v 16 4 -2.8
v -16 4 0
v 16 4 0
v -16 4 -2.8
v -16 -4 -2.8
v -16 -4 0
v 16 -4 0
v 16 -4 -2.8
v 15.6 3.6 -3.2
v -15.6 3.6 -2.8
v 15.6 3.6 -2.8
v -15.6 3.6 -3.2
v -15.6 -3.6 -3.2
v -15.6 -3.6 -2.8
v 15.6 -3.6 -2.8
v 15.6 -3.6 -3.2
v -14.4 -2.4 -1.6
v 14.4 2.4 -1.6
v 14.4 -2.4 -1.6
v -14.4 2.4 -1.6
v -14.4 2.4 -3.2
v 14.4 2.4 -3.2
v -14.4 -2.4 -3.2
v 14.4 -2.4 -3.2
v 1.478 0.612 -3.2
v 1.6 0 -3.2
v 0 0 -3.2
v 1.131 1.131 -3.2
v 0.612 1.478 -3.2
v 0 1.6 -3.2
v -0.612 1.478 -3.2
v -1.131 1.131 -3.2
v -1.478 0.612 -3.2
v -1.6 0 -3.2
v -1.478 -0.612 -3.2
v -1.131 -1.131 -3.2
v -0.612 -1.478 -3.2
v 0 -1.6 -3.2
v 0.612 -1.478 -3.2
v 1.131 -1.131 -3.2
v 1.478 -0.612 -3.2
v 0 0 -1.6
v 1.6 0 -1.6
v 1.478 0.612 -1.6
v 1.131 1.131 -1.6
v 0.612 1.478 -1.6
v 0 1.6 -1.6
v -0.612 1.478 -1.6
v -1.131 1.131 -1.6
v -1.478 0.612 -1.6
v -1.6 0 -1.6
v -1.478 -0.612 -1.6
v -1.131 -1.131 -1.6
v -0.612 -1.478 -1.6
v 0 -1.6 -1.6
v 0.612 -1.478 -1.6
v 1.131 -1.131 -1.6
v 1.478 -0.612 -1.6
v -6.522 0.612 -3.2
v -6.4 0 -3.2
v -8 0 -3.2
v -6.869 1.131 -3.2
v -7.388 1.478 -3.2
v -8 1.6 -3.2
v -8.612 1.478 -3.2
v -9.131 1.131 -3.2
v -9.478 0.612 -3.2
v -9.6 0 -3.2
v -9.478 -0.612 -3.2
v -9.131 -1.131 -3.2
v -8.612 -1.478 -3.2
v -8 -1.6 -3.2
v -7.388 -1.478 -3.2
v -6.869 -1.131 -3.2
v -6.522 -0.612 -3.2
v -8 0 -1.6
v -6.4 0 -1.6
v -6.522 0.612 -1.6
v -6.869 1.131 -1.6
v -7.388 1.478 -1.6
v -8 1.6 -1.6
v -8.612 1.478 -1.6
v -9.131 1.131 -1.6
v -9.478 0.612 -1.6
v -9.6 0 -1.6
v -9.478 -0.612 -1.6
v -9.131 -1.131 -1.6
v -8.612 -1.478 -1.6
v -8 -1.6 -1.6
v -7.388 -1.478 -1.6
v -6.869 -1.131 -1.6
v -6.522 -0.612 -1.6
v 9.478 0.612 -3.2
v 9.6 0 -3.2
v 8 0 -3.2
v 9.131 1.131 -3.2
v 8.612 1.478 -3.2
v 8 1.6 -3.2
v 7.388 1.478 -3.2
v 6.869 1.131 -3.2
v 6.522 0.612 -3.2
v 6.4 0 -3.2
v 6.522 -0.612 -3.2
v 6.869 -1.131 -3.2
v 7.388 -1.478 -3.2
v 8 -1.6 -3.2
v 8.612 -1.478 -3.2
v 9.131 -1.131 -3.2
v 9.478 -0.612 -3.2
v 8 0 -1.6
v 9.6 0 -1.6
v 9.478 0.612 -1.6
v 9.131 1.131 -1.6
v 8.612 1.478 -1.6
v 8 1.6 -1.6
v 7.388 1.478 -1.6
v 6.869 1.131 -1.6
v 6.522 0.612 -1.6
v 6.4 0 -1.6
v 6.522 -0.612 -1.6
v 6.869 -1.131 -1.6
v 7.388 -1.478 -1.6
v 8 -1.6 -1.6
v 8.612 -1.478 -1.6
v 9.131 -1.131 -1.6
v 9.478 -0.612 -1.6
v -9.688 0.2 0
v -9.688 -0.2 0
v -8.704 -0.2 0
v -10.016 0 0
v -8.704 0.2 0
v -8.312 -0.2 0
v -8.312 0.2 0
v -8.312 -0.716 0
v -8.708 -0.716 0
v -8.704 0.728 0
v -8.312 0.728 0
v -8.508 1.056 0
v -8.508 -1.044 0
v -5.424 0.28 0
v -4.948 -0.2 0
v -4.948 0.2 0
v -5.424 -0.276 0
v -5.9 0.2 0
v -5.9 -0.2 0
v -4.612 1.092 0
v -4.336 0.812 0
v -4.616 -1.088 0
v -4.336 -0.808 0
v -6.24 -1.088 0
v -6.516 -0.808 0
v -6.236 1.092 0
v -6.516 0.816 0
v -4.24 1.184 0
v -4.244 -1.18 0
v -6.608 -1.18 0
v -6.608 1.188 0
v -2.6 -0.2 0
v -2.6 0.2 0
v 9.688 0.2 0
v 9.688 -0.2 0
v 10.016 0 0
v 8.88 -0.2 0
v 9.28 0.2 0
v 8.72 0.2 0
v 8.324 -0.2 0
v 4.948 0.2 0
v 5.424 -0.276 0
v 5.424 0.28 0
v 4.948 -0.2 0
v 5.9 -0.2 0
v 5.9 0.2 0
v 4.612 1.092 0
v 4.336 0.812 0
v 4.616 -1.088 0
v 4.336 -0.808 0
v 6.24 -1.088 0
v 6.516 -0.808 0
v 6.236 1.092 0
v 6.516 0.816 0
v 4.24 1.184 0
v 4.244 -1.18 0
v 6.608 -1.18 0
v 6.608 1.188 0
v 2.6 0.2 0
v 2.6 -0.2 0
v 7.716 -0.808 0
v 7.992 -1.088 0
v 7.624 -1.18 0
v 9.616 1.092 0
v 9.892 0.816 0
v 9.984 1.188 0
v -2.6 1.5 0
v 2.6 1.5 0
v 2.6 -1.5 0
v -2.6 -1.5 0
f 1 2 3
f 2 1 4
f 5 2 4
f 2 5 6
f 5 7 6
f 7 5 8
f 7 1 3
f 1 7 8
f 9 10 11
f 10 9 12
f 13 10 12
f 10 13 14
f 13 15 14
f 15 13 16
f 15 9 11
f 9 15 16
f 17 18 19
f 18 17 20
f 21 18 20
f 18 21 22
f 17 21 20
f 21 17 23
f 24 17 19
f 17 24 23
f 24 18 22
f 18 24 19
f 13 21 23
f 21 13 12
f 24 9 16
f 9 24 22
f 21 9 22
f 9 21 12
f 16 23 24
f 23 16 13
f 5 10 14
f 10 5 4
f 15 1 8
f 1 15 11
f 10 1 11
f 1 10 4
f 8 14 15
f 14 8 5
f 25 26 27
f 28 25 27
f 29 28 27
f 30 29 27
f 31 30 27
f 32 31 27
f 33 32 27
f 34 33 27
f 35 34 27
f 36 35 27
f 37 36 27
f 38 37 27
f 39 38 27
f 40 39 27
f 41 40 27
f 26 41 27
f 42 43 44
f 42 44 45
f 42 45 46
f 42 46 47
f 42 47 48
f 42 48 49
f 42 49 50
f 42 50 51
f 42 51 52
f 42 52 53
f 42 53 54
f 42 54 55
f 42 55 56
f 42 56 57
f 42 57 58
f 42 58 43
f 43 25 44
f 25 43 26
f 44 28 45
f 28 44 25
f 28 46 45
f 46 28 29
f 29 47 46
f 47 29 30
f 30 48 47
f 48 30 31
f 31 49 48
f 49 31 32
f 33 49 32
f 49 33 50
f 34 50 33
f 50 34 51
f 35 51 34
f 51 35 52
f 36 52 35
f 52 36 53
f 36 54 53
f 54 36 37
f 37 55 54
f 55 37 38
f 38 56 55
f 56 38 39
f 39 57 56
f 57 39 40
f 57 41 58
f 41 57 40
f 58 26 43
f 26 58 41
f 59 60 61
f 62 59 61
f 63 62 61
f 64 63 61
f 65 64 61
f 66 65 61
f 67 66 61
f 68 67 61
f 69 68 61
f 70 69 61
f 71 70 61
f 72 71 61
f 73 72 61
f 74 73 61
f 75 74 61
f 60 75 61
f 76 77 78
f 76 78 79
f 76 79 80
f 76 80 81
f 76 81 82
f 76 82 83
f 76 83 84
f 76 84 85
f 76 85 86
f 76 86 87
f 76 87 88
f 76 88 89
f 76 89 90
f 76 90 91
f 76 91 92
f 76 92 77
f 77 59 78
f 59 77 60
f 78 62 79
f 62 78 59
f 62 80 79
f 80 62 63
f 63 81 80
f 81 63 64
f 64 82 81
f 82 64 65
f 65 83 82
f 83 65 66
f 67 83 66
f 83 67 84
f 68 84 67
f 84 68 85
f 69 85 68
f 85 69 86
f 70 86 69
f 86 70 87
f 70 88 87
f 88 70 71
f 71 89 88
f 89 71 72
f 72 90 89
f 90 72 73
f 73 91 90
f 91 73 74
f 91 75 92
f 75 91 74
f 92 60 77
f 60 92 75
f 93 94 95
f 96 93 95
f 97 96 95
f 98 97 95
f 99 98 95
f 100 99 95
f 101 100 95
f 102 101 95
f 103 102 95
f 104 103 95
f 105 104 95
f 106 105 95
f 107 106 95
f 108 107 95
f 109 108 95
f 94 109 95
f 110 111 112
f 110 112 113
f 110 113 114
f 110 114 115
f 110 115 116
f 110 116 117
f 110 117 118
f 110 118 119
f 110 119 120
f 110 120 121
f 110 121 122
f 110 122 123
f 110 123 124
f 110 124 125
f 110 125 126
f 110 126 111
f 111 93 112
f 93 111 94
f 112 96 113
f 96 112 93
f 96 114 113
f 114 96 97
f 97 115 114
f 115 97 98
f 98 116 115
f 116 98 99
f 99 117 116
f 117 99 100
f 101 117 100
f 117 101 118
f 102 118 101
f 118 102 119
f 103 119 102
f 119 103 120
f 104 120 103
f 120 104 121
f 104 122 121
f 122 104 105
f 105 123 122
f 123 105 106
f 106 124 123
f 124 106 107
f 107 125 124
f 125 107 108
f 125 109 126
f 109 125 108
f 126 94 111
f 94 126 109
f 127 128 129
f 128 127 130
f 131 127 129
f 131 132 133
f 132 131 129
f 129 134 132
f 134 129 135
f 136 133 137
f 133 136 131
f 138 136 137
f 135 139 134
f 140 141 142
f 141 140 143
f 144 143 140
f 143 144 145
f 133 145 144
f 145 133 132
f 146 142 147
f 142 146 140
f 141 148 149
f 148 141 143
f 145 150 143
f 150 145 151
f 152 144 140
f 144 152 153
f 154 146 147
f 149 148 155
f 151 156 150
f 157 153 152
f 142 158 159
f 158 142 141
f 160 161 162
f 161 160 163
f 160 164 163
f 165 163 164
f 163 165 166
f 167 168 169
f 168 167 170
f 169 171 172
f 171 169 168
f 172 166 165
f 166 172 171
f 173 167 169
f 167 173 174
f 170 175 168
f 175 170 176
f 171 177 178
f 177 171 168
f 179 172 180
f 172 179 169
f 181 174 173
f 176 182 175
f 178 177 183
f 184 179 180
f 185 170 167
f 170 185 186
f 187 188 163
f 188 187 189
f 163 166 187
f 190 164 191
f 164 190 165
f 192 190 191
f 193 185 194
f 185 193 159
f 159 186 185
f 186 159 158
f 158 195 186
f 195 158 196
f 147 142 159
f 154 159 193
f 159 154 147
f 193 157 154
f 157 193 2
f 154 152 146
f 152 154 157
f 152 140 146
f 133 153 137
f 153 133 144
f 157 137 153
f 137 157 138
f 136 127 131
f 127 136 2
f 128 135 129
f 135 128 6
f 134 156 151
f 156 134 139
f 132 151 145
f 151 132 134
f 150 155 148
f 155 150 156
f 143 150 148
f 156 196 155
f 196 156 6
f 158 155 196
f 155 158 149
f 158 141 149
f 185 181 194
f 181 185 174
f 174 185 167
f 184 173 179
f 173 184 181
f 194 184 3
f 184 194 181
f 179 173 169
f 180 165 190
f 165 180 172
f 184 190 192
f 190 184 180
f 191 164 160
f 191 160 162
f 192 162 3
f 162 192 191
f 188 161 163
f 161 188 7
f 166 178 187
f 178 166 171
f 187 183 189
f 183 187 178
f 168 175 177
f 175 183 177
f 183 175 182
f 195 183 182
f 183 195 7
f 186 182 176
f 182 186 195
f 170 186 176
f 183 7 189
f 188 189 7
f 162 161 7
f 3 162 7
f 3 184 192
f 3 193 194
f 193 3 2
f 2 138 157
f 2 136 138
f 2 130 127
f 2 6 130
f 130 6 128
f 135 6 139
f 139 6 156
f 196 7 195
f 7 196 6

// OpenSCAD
// file: ../p/4-4edge.scad
use <../lib.scad>
function ldraw_lib__4_4edge() = [
// 0 Circle 1.0
// 0 Name: 4-4edge.dat
// 0 Author: James Jessiman
// 0 !LDRAW_ORG Primitive UPDATE 2017-01
// 0 !LICENSE Licensed under CC BY 2.0 and CC BY 4.0 : see CAreadme.txt
// 
// 0 BFC CERTIFY CCW
  [0,"BFC","CERTIFY"],
  [0,"BFC","CCW"],
// 
// 0 !HISTORY 1998-12-15 [PTadmin] Official Update 1998-10
// 0 !HISTORY 2005-12-28 [PTadmin] Official Update 2005-01
// 0 !HISTORY 2007-06-24 [PTadmin] Header formatted for Contributor Agreement
// 0 !HISTORY 2008-07-01 [PTadmin] Official Update 2008-01
// 0 !HISTORY 2017-01-15 [Steffen] BFCed
// 0 !HISTORY 2017-12-30 [PTadmin] Official Update 2017-01
// 
// 
// 2 24 1 0 0 0.9239 0 0.3827
  [2,24,1,0,0,0.9239,0,0.3827],
// 2 24 0.9239 0 0.3827 0.7071 0 0.7071
  [2,24,0.9239,0,0.3827,0.7071,0,0.7071],
// 2 24 0.7071 0 0.7071 0.3827 0 0.9239
  [2,24,0.7071,0,0.7071,0.3827,0,0.9239],
// 2 24 0.3827 0 0.9239 0 0 1
  [2,24,0.3827,0,0.9239,0,0,1],
// 2 24 0 0 1 -0.3827 0 0.9239
  [2,24,0,0,1,-0.3827,0,0.9239],
// 2 24 -0.3827 0 0.9239 -0.7071 0 0.7071
  [2,24,-0.3827,0,0.9239,-0.7071,0,0.7071],
// 2 24 -0.7071 0 0.7071 -0.9239 0 0.3827
  [2,24,-0.7071,0,0.7071,-0.9239,0,0.3827],
// 2 24 -0.9239 0 0.3827 -1 0 -0
  [2,24,-0.9239,0,0.3827,-1,0,-0],
// 2 24 -1 0 -0 -0.9239 0 -0.3827
  [2,24,-1,0,-0,-0.9239,0,-0.3827],
// 2 24 -0.9239 0 -0.3827 -0.7071 0 -0.7071
  [2,24,-0.9239,0,-0.3827,-0.7071,0,-0.7071],
// 2 24 -0.7071 0 -0.7071 -0.3827 0 -0.9239
  [2,24,-0.7071,0,-0.7071,-0.3827,0,-0.9239],
// 2 24 -0.3827 0 -0.9239 0 0 -1
  [2,24,-0.3827,0,-0.9239,0,0,-1],
// 2 24 0 0 -1 0.3827 0 -0.9239
  [2,24,0,0,-1,0.3827,0,-0.9239],
// 2 24 0.3827 0 -0.9239 0.7071 0 -0.7071
  [2,24,0.3827,0,-0.9239,0.7071,0,-0.7071],
// 2 24 0.7071 0 -0.7071 0.9239 0 -0.3827
  [2,24,0.7071,0,-0.7071,0.9239,0,-0.3827],
// 2 24 0.9239 0 -0.3827 1 0 0
  [2,24,0.9239,0,-0.3827,1,0,0],
];
module ldraw_lib__4_4edge(step=0, col=false, unit=2/5, alt=false, line=0.2, solid=!$preview)
    makepoly(ldraw_lib__4_4edge(), step=step, col=col, unit=unit, alt=alt, line=line, solid=solid);
ldraw_lib__4_4edge(line=0.2);
// file: ../p/4-4disc.scad
use <../lib.scad>
function ldraw_lib__4_4disc() = [
// 0 Disc 1.0
// 0 Name: 4-4disc.dat
// 0 Author: James Jessiman
// 0 !LDRAW_ORG Primitive UPDATE 2002-02
// 0 !LICENSE Licensed under CC BY 2.0 and CC BY 4.0 : see CAreadme.txt
// 
// 0 BFC CERTIFY CCW
  [0,"BFC","CERTIFY"],
  [0,"BFC","CCW"],
// 
// 0 !HISTORY 1998-12-15 [PTadmin] Official Update 1998-10
// 0 !HISTORY 2002-03-23 [sbliss] Added BFC statement
// 0 !HISTORY 2002-04-25 [PTadmin] Official Update 2002-02
// 0 !HISTORY 2007-06-24 [PTadmin] Header formatted for Contributor Agreement
// 0 !HISTORY 2008-07-01 [PTadmin] Official Update 2008-01
// 
// 
// 3 16 0 0 0 1 0 0 0.9239 0 0.3827
  [3,16,0,0,0,1,0,0,0.9239,0,0.3827],
// 3 16 0 0 0 0.9239 0 0.3827 0.7071 0 0.7071
  [3,16,0,0,0,0.9239,0,0.3827,0.7071,0,0.7071],
// 3 16 0 0 0 0.7071 0 0.7071 0.3827 0 0.9239
  [3,16,0,0,0,0.7071,0,0.7071,0.3827,0,0.9239],
// 3 16 0 0 0 0.3827 0 0.9239 0 0 1
  [3,16,0,0,0,0.3827,0,0.9239,0,0,1],
// 3 16 0 0 0 0 0 1 -0.3827 0 0.9239
  [3,16,0,0,0,0,0,1,-0.3827,0,0.9239],
// 3 16 0 0 0 -0.3827 0 0.9239 -0.7071 0 0.7071
  [3,16,0,0,0,-0.3827,0,0.9239,-0.7071,0,0.7071],
// 3 16 0 0 0 -0.7071 0 0.7071 -0.9239 0 0.3827
  [3,16,0,0,0,-0.7071,0,0.7071,-0.9239,0,0.3827],
// 3 16 0 0 0 -0.9239 0 0.3827 -1 0 -0
  [3,16,0,0,0,-0.9239,0,0.3827,-1,0,-0],
// 3 16 0 0 0 -1 0 -0 -0.9239 0 -0.3827
  [3,16,0,0,0,-1,0,-0,-0.9239,0,-0.3827],
// 3 16 0 0 0 -0.9239 0 -0.3827 -0.7071 0 -0.7071
  [3,16,0,0,0,-0.9239,0,-0.3827,-0.7071,0,-0.7071],
// 3 16 0 0 0 -0.7071 0 -0.7071 -0.3827 0 -0.9239
  [3,16,0,0,0,-0.7071,0,-0.7071,-0.3827,0,-0.9239],
// 3 16 0 0 0 -0.3827 0 -0.9239 0 0 -1
  [3,16,0,0,0,-0.3827,0,-0.9239,0,0,-1],
// 3 16 0 0 0 0 0 -1 0.3827 0 -0.9239
  [3,16,0,0,0,0,0,-1,0.3827,0,-0.9239],
// 3 16 0 0 0 0.3827 0 -0.9239 0.7071 0 -0.7071
  [3,16,0,0,0,0.3827,0,-0.9239,0.7071,0,-0.7071],
// 3 16 0 0 0 0.7071 0 -0.7071 0.9239 0 -0.3827
  [3,16,0,0,0,0.7071,0,-0.7071,0.9239,0,-0.3827],
// 3 16 0 0 0 0.9239 0 -0.3827 1 0 0
  [3,16,0,0,0,0.9239,0,-0.3827,1,0,0],
// 0
];
module ldraw_lib__4_4disc(step=0, col=false, unit=2/5, alt=false, line=0.2, solid=!$preview)
    makepoly(ldraw_lib__4_4disc(), step=step, col=col, unit=unit, alt=alt, line=line, solid=solid);
ldraw_lib__4_4disc(line=0.2);
// file: ../p/4-4cyli.scad
use <../lib.scad>
$fa=1; $fs=0.2;
function ldraw_lib__4_4cyli(realsolid=false) = [
// 0 Cylinder 1.0
// 0 Name: 4-4cyli.dat
// 0 Author: James Jessiman
// 0 !LDRAW_ORG Primitive UPDATE 2005-01
// 0 !LICENSE Licensed under CC BY 2.0 and CC BY 4.0 : see CAreadme.txt
// 
// 0 BFC CERTIFY CCW
  [0,"BFC","CERTIFY"],
  [0,"BFC","CCW"],
// 
// 0 !HISTORY 1998-12-15 [PTadmin] Official Update 1998-10
// 0 !HISTORY 2002-03-23 [sbliss] Added BFC statement; merged headers from files in distributions LDraw 0.27 and Complete.
// 0 !HISTORY 2002-04-25 [PTadmin] Official Update 2002-02
// 0 !HISTORY 2004-12-14 [guyvivan] BFC CCW
// 0 !HISTORY 2005-12-28 [PTadmin] Official Update 2005-01
// 0 !HISTORY 2007-06-24 [PTadmin] Header formatted for Contributor Agreement
// 0 !HISTORY 2008-07-01 [PTadmin] Official Update 2008-01
// 
// 
// 4 16 1 1 0 0.9239 1 0.3827 0.9239 0 0.3827 1 0 0
  [4,16,1,1,0,0.9239,1,0.3827,0.9239,0,0.3827,1,0,0],
// 5 24 1 0 0 1 1 0 0.9239 0 0.3827 0.9239 0 -0.3827
  [5,24,1,0,0,1,1,0,0.9239,0,0.3827,0.9239,0,-0.3827],
// 4 16 0.9239 1 0.3827 0.7071 1 0.7071 0.7071 0 0.7071 0.9239 0 0.3827
  [4,16,0.9239,1,0.3827,0.7071,1,0.7071,0.7071,0,0.7071,0.9239,0,0.3827],
// 5 24 0.9239 0 0.3827 0.9239 1 0.3827 0.7071 0 0.7071 1 0 0
  [5,24,0.9239,0,0.3827,0.9239,1,0.3827,0.7071,0,0.7071,1,0,0],
// 4 16 0.7071 1 0.7071 0.3827 1 0.9239 0.3827 0 0.9239 0.7071 0 0.7071
  [4,16,0.7071,1,0.7071,0.3827,1,0.9239,0.3827,0,0.9239,0.7071,0,0.7071],
// 5 24 0.7071 0 0.7071 0.7071 1 0.7071 0.3827 0 0.9239 0.9239 0 0.3827
  [5,24,0.7071,0,0.7071,0.7071,1,0.7071,0.3827,0,0.9239,0.9239,0,0.3827],
// 4 16 0.3827 1 0.9239 0 1 1 0 0 1 0.3827 0 0.9239
  [4,16,0.3827,1,0.9239,0,1,1,0,0,1,0.3827,0,0.9239],
// 5 24 0.3827 0 0.9239 0.3827 1 0.9239 0 0 1 0.7071 0 0.7071
  [5,24,0.3827,0,0.9239,0.3827,1,0.9239,0,0,1,0.7071,0,0.7071],
// 4 16 0 1 1 -0.3827 1 0.9239 -0.3827 0 0.9239 0 0 1
  [4,16,0,1,1,-0.3827,1,0.9239,-0.3827,0,0.9239,0,0,1],
// 5 24 0 0 1 0 1 1 -0.3827 0 0.9239 0.3827 0 0.9239
  [5,24,0,0,1,0,1,1,-0.3827,0,0.9239,0.3827,0,0.9239],
// 4 16 -0.3827 1 0.9239 -0.7071 1 0.7071 -0.7071 0 0.7071 -0.3827 0 0.9239
  [4,16,-0.3827,1,0.9239,-0.7071,1,0.7071,-0.7071,0,0.7071,-0.3827,0,0.9239],
// 5 24 -0.3827 0 0.9239 -0.3827 1 0.9239 -0.7071 0 0.7071 0 0 1
  [5,24,-0.3827,0,0.9239,-0.3827,1,0.9239,-0.7071,0,0.7071,0,0,1],
// 4 16 -0.7071 1 0.7071 -0.9239 1 0.3827 -0.9239 0 0.3827 -0.7071 0 0.7071
  [4,16,-0.7071,1,0.7071,-0.9239,1,0.3827,-0.9239,0,0.3827,-0.7071,0,0.7071],
// 5 24 -0.7071 0 0.7071 -0.7071 1 0.7071 -0.9239 0 0.3827 -0.3827 0 0.9239
  [5,24,-0.7071,0,0.7071,-0.7071,1,0.7071,-0.9239,0,0.3827,-0.3827,0,0.9239],
// 4 16 -0.9239 1 0.3827 -1 1 0 -1 0 0 -0.9239 0 0.3827
  [4,16,-0.9239,1,0.3827,-1,1,0,-1,0,0,-0.9239,0,0.3827],
// 5 24 -0.9239 0 0.3827 -0.9239 1 0.3827 -1 0 0 -0.7071 0 0.7071
  [5,24,-0.9239,0,0.3827,-0.9239,1,0.3827,-1,0,0,-0.7071,0,0.7071],
// 4 16 -1 1 0 -0.9239 1 -0.3827 -0.9239 0 -0.3827 -1 0 0
  [4,16,-1,1,0,-0.9239,1,-0.3827,-0.9239,0,-0.3827,-1,0,0],
// 5 24 -1 0 0 -1 1 0 -0.9239 0 -0.3827 -0.9239 0 0.3827
  [5,24,-1,0,0,-1,1,0,-0.9239,0,-0.3827,-0.9239,0,0.3827],
// 4 16 -0.9239 1 -0.3827 -0.7071 1 -0.7071 -0.7071 0 -0.7071 -0.9239 0 -0.3827
  [4,16,-0.9239,1,-0.3827,-0.7071,1,-0.7071,-0.7071,0,-0.7071,-0.9239,0,-0.3827],
// 5 24 -0.9239 0 -0.3827 -0.9239 1 -0.3827 -0.7071 0 -0.7071 -1 0 0
  [5,24,-0.9239,0,-0.3827,-0.9239,1,-0.3827,-0.7071,0,-0.7071,-1,0,0],
// 4 16 -0.7071 1 -0.7071 -0.3827 1 -0.9239 -0.3827 0 -0.9239 -0.7071 0 -0.7071
  [4,16,-0.7071,1,-0.7071,-0.3827,1,-0.9239,-0.3827,0,-0.9239,-0.7071,0,-0.7071],
// 5 24 -0.7071 0 -0.7071 -0.7071 1 -0.7071 -0.3827 0 -0.9239 -0.9239 0 -0.3827
  [5,24,-0.7071,0,-0.7071,-0.7071,1,-0.7071,-0.3827,0,-0.9239,-0.9239,0,-0.3827],
// 4 16 -0.3827 1 -0.9239 0 1 -1 0 0 -1 -0.3827 0 -0.9239
  [4,16,-0.3827,1,-0.9239,0,1,-1,0,0,-1,-0.3827,0,-0.9239],
// 5 24 -0.3827 0 -0.9239 -0.3827 1 -0.9239 0 0 -1 -0.7071 0 -0.7071
  [5,24,-0.3827,0,-0.9239,-0.3827,1,-0.9239,0,0,-1,-0.7071,0,-0.7071],
// 4 16 0 1 -1 0.3827 1 -0.9239 0.3827 0 -0.9239 0 0 -1
  [4,16,0,1,-1,0.3827,1,-0.9239,0.3827,0,-0.9239,0,0,-1],
// 5 24 0 0 -1 0 1 -1 0.3827 0 -0.9239 -0.3827 0 -0.9239
  [5,24,0,0,-1,0,1,-1,0.3827,0,-0.9239,-0.3827,0,-0.9239],
// 4 16 0.3827 1 -0.9239 0.7071 1 -0.7071 0.7071 0 -0.7071 0.3827 0 -0.9239
  [4,16,0.3827,1,-0.9239,0.7071,1,-0.7071,0.7071,0,-0.7071,0.3827,0,-0.9239],
// 5 24 0.3827 0 -0.9239 0.3827 1 -0.9239 0.7071 0 -0.7071 0 0 -1
  [5,24,0.3827,0,-0.9239,0.3827,1,-0.9239,0.7071,0,-0.7071,0,0,-1],
// 4 16 0.7071 1 -0.7071 0.9239 1 -0.3827 0.9239 0 -0.3827 0.7071 0 -0.7071
  [4,16,0.7071,1,-0.7071,0.9239,1,-0.3827,0.9239,0,-0.3827,0.7071,0,-0.7071],
// 5 24 0.7071 0 -0.7071 0.7071 1 -0.7071 0.9239 0 -0.3827 0.3827 0 -0.9239
  [5,24,0.7071,0,-0.7071,0.7071,1,-0.7071,0.9239,0,-0.3827,0.3827,0,-0.9239],
// 4 16 0.9239 1 -0.3827 1 1 0 1 0 0 0.9239 0 -0.3827
  [4,16,0.9239,1,-0.3827,1,1,0,1,0,0,0.9239,0,-0.3827],
// 5 24 0.9239 0 -0.3827 0.9239 1 -0.3827 1 0 0 0.7071 0 -0.7071
  [5,24,0.9239,0,-0.3827,0.9239,1,-0.3827,1,0,0,0.7071,0,-0.7071],
// 0
];
module ldraw_lib__4_4cyli(step=0, col=false, unit=2/5, alt=false, line=0.2, solid=!$preview)
    makepoly(ldraw_lib__4_4cyli(solid), step=step, col=col, unit=unit, alt=alt, line=line, solid=solid);
ldraw_lib__4_4cyli(line=0.2);
// file: ../p/stud3.scad
use <../lib.scad>
use <4-4cyli.scad>
use <4-4disc.scad>
use <4-4edge.scad>
function ldraw_lib__stud3() = [
// 0 Stud Tube Solid
// 0 Name: stud3.dat
// 0 Author: James Jessiman
// 0 !LDRAW_ORG Primitive UPDATE 2012-01
// 0 !LICENSE Licensed under CC BY 4.0 : see CAreadme.txt
// 
// 0 BFC CERTIFY CCW
  [0,"BFC","CERTIFY"],
  [0,"BFC","CCW"],
// 
// 0 !HISTORY 2002-04-04 [sbliss] Modified for BFC compliance
// 0 !HISTORY 2002-04-25 [PTadmin] Official Update 2002-02
// 0 !HISTORY 2007-06-24 [PTadmin] Header formatted for Contributor Agreement
// 0 !HISTORY 2008-07-01 [PTadmin] Official Update 2008-01
// 0 !HISTORY 2012-02-16 [Philo] Changed to CCW
// 0 !HISTORY 2012-03-30 [PTadmin] Official Update 2012-01
// 
// 
// 1 16 0 -4 0 4 0 0 0 1 0 0 0 4 4-4edge.dat
  [1,16,0,-4,0,4,0,0,0,1,0,0,0,4, ldraw_lib__4_4edge()],
// 1 16 0 0 0 4 0 0 0 1 0 0 0 4 4-4edge.dat
  [1,16,0,0,0,4,0,0,0,1,0,0,0,4, ldraw_lib__4_4edge()],
// 1 16 0 -4 0 4 0 0 0 1 0 0 0 4 4-4disc.dat
  [1,16,0,-4,0,4,0,0,0,1,0,0,0,4, ldraw_lib__4_4disc()],
  [-1,16,0,0,0,4,0,0,0,-1,0,0,0,4, ldraw_lib__4_4disc()],
// 1 16 0 -4 0 4 0 0 0 4 0 0 0 4 4-4cyli.dat
  [1,16,0,-4,0,4,0,0,0,4,0,0,0,4, ldraw_lib__4_4cyli()],
];
module ldraw_lib__stud3(step=0, col=false, unit=2/5, alt=false, line=0.2, solid=!$preview)
    makepoly(ldraw_lib__stud3(), step=step, col=col, unit=unit, alt=alt, line=line, solid=solid);
ldraw_lib__stud3(line=0.2);
// file: ../p/box5.scad
use <../lib.scad>
function ldraw_lib__box5() = [
// 0 Box with 5 Faces and All Edges
// 0 Name: box5.dat
// 0 Author: James Jessiman
// 0 !LDRAW_ORG Primitive UPDATE 2012-01
// 0 !LICENSE Licensed under CC BY 2.0 and CC BY 4.0 : see CAreadme.txt
// 
// 0 BFC CERTIFY CCW
  [0,"BFC","CERTIFY"],
  [0,"BFC","CCW"],
// 
// 0 !HISTORY 2002-04-03 [sbliss] Modified for BFC compliance
// 0 !HISTORY 2002-04-25 [PTadmin] Official Update 2002-02
// 0 !HISTORY 2007-06-24 [PTadmin] Header formatted for Contributor Agreement
// 0 !HISTORY 2008-07-01 [PTadmin] Official Update 2008-01
// 0 !HISTORY 2012-02-16 [Philo] Changed to CCW
// 0 !HISTORY 2012-03-30 [PTadmin] Official Update 2012-01
// 
// 
// 2 24 1 1 1 -1 1 1
  [2,24,1,1,1,-1,1,1],
// 2 24 -1 1 1 -1 1 -1
  [2,24,-1,1,1,-1,1,-1],
// 2 24 -1 1 -1 1 1 -1
  [2,24,-1,1,-1,1,1,-1],
// 2 24 1 1 -1 1 1 1
  [2,24,1,1,-1,1,1,1],
// 2 24 1 0 1 -1 0 1
  [2,24,1,0,1,-1,0,1],
// 2 24 -1 0 1 -1 0 -1
  [2,24,-1,0,1,-1,0,-1],
// 2 24 -1 0 -1 1 0 -1
  [2,24,-1,0,-1,1,0,-1],
// 2 24 1 0 -1 1 0 1
  [2,24,1,0,-1,1,0,1],
// 2 24 1 0 1 1 1 1
  [2,24,1,0,1,1,1,1],
// 2 24 -1 0 1 -1 1 1
  [2,24,-1,0,1,-1,1,1],
// 2 24 1 0 -1 1 1 -1
  [2,24,1,0,-1,1,1,-1],
// 2 24 -1 0 -1 -1 1 -1
  [2,24,-1,0,-1,-1,1,-1],
// 4 16 -1 1 1 1 1 1 1 1 -1 -1 1 -1
  [4,16,-1,1,1,1,1,1,1,1,-1,-1,1,-1],
// 4 16 -1 1 1 -1 0 1 1 0 1 1 1 1
  [4,16,-1,1,1,-1,0,1,1,0,1,1,1,1],
// 4 16 -1 1 -1 -1 0 -1 -1 0 1 -1 1 1
  [4,16,-1,1,-1,-1,0,-1,-1,0,1,-1,1,1],
// 4 16 1 1 -1 1 0 -1 -1 0 -1 -1 1 -1
  [4,16,1,1,-1,1,0,-1,-1,0,-1,-1,1,-1],
// 4 16 1 1 1 1 0 1 1 0 -1 1 1 -1
  [4,16,1,1,1,1,0,1,1,0,-1,1,1,-1],
];
makepoly(ldraw_lib__box5(), line=0.2);
// file: ../p/box4.scad
use <../lib.scad>
function ldraw_lib__box4() = [
// 0 Box with 4 Faces (2 Parallel Pairs) and All Edges
// 0 Name: box4.dat
// 0 Author: James Jessiman
// 0 !LDRAW_ORG Primitive UPDATE 2012-01
// 0 !LICENSE Licensed under CC BY 4.0 : see CAreadme.txt
// 
// 0 BFC CERTIFY CCW
  [0,"BFC","CERTIFY"],
  [0,"BFC","CCW"],
// 
// 0 !HISTORY 2002-04-03 [sbliss] Modified for BFC compliance
// 0 !HISTORY 2002-04-25 [PTadmin] Official Update 2002-02
// 0 !HISTORY 2007-06-24 [PTadmin] Header formatted for Contributor Agreement
// 0 !HISTORY 2008-07-01 [PTadmin] Official Update 2008-01
// 0 !HISTORY 2012-02-16 [Philo] Changed to CCW
// 0 !HISTORY 2012-03-30 [PTadmin] Official Update 2012-01
// 
// 
// 2 24 1 1 1 -1 1 1
  [2,24,1,1,1,-1,1,1],
// 2 24 -1 1 1 -1 1 -1
  [2,24,-1,1,1,-1,1,-1],
// 2 24 -1 1 -1 1 1 -1
  [2,24,-1,1,-1,1,1,-1],
// 2 24 1 1 -1 1 1 1
  [2,24,1,1,-1,1,1,1],
// 2 24 1 0 1 -1 0 1
  [2,24,1,0,1,-1,0,1],
// 2 24 -1 0 1 -1 0 -1
  [2,24,-1,0,1,-1,0,-1],
// 2 24 -1 0 -1 1 0 -1
  [2,24,-1,0,-1,1,0,-1],
// 2 24 1 0 -1 1 0 1
  [2,24,1,0,-1,1,0,1],
// 2 24 1 0 1 1 1 1
  [2,24,1,0,1,1,1,1],
// 2 24 -1 0 1 -1 1 1
  [2,24,-1,0,1,-1,1,1],
// 2 24 1 0 -1 1 1 -1
  [2,24,1,0,-1,1,1,-1],
// 2 24 -1 0 -1 -1 1 -1
  [2,24,-1,0,-1,-1,1,-1],
// 4 16 -1 1 1 -1 0 1 1 0 1 1 1 1
  [4,16,-1,1,1,-1,0,1,1,0,1,1,1,1],
// 4 16 -1 1 -1 -1 0 -1 -1 0 1 -1 1 1
  [4,16,-1,1,-1,-1,0,-1,-1,0,1,-1,1,1],
// 4 16 1 1 -1 1 0 -1 -1 0 -1 -1 1 -1
  [4,16,1,1,-1,1,0,-1,-1,0,-1,-1,1,-1],
// 4 16 1 1 1 1 0 1 1 0 -1 1 1 -1
  [4,16,1,1,1,1,0,1,1,0,-1,1,1,-1],
];
module ldraw_lib__box4(step=0, col=false, unit=2/5, alt=false, line=0.2, solid=!$preview)
    makepoly(ldraw_lib__box4(), step=step, col=col, unit=unit, alt=alt, line=line, solid=solid);
ldraw_lib__box4(line=0.2);
// file: s/2431s01.scad
use <../../lib.scad>
use <../../p/box4.scad>
use <../../p/box5.scad>
use <../../p/stud3.scad>
function ldraw_lib__s__2431s01() = [
// 0 ~Tile  1 x  4 with Groove without Top Face
// 0 Name: s\2431s01.dat
// 0 Author: Santeri Piippo [arezey]
// 0 !LDRAW_ORG Subpart UPDATE 2010-02
// 0 !LICENSE Licensed under CC BY 2.0 and CC BY 4.0 : see CAreadme.txt
// 
// 0 BFC CERTIFY CCW
  [0,"BFC","CERTIFY"],
  [0,"BFC","CCW"],
// 
// 0 !HISTORY 2010-07-05 [PTadmin] Official Update 2010-02
// 
// 
// 1 16 0 0 0 40 0 0 0 7 0 0 0 10 box4.dat
  [1,16,0,0,0,40,0,0,0,7,0,0,0,10, ldraw_lib__box4()],
// 1 16 0 7 0 39 0 0 0 1 0 0 0 9 box4.dat
  [1,16,0,7,0,39,0,0,0,1,0,0,0,9, ldraw_lib__box4()],
// 0 BFC INVERTNEXT
  [0,"BFC","INVERTNEXT"],
// 1 16 0 8 0 36 0 0 0 -4 0 0 0 6 box5.dat
  [1,16,0,8,0,36,0,0,0,-4,0,0,0,6, ldraw_lib__box5()],
// 4 16 -39 8 9 -36 8 6 -36 8 -6 -39 8 -9
  [4,16,-39,8,9,-36,8,6,-36,8,-6,-39,8,-9],
// 4 16 39 8 -9 36 8 -6 36 8 6 39 8 9
  [4,16,39,8,-9,36,8,-6,36,8,6,39,8,9],
// 4 16 39 8 9 36 8 6 -36 8 6 -39 8 9
  [4,16,39,8,9,36,8,6,-36,8,6,-39,8,9],
// 4 16 -39 8 -9 -36 8 -6 36 8 -6 39 8 -9
  [4,16,-39,8,-9,-36,8,-6,36,8,-6,39,8,-9],
// 4 16 -40 7 10 -39 7 9 -39 7 -9 -40 7 -10
  [4,16,-40,7,10,-39,7,9,-39,7,-9,-40,7,-10],
// 4 16 40 7 -10 39 7 -9 39 7 9 40 7 10
  [4,16,40,7,-10,39,7,-9,39,7,9,40,7,10],
// 4 16 40 7 10 39 7 9 -39 7 9 -40 7 10
  [4,16,40,7,10,39,7,9,-39,7,9,-40,7,10],
// 4 16 -40 7 -10 -39 7 -9 39 7 -9 40 7 -10
  [4,16,-40,7,-10,-39,7,-9,39,7,-9,40,7,-10],
// 1 16 0 4 0 1 0 0 0 -1 0 0 0 1 stud3.dat
  [1,16,0,4,0,1,0,0,0,-1,0,0,0,1, ldraw_lib__stud3()],
// 1 16 -20 4 0 1 0 0 0 -1 0 0 0 1 stud3.dat
  [1,16,-20,4,0,1,0,0,0,-1,0,0,0,1, ldraw_lib__stud3()],
// 1 16 20 4 0 1 0 0 0 -1 0 0 0 1 stud3.dat
  [1,16,20,4,0,1,0,0,0,-1,0,0,0,1, ldraw_lib__stud3()],
// 0 //
];
makepoly(ldraw_lib__s__2431s01(), line=0.2);
// main file
use <../lib.scad>
use <s/2431s01.scad>
function ldraw_lib__2431pzo() = [
// 0 Tile  1 x  4 with Medium Blue Stitches and Dark Red Mouth Pattern
// 0 Name: 2431pzo.dat
// 0 Author: Magnus Forsberg [MagFors]
// 0 !LDRAW_ORG Part UPDATE 2020-03
// 0 !LICENSE Licensed under CC BY 4.0 : see CAreadme.txt
// 
// 0 BFC CERTIFY CCW
  [0,"BFC","CERTIFY"],
  [0,"BFC","CCW"],
// 
// 0 !KEYWORDS Brickheads, bricklink 2431pb548, Rebrickable 2431pr0138, Sally
// 0 !KEYWORDS set 41630
// 
// 0 !HISTORY 2020-12-29 [PTadmin] Official Update 2020-03
// 
// 
// 1 16 0 0 0 1 0 0 0 1 0 0 0 1 s\2431s01.dat
  [1,16,0,0,0,1,0,0,0,1,0,0,0,1, ldraw_lib__s__2431s01()],
// 4 73 -24.22 0 .5 -25.04 0 0 -24.22 0 -.5 -21.76 0 -.5
  [4,73,-24.22,0,.5,-25.04,0,0,-24.22,0,-.5,-21.76,0,-.5],
// 3 73 -21.76 0 .5 -24.22 0 .5 -21.76 0 -.5
  [3,73,-21.76,0,.5,-24.22,0,.5,-21.76,0,-.5],
// 4 73 -20.78 0 .5 -21.76 0 .5 -21.76 0 -.5 -20.78 0 -.5
  [4,73,-20.78,0,.5,-21.76,0,.5,-21.76,0,-.5,-20.78,0,-.5],
// 4 73 -20.78 0 -1.79 -20.78 0 -.5 -21.76 0 -.5 -21.77 0 -1.79
  [4,73,-20.78,0,-1.79,-20.78,0,-.5,-21.76,0,-.5,-21.77,0,-1.79],
// 4 73 -21.76 0 1.82 -21.76 0 .5 -20.78 0 .5 -20.78 0 1.82
  [4,73,-21.76,0,1.82,-21.76,0,.5,-20.78,0,.5,-20.78,0,1.82],
// 3 73 -21.27 0 2.64 -21.76 0 1.82 -20.78 0 1.82
  [3,73,-21.27,0,2.64,-21.76,0,1.82,-20.78,0,1.82],
// 3 73 -21.77 0 -1.79 -21.27 0 -2.61 -20.78 0 -1.79
  [3,73,-21.77,0,-1.79,-21.27,0,-2.61,-20.78,0,-1.79],
// 4 73 -12.37 0 .5 -13.56 0 .7 -13.56 0 -.69 -12.37 0 -.5
  [4,73,-12.37,0,.5,-13.56,0,.7,-13.56,0,-.69,-12.37,0,-.5],
// 4 73 -14.75 0 -.5 -13.56 0 -.69 -13.56 0 .7 -14.75 0 .5
  [4,73,-14.75,0,-.5,-13.56,0,-.69,-13.56,0,.7,-14.75,0,.5],
// 4 73 -20.78 0 -.5 -14.75 0 -.5 -14.75 0 .5 -20.78 0 .5
  [4,73,-20.78,0,-.5,-14.75,0,-.5,-14.75,0,.5,-20.78,0,.5],
// 4 73 -13.56 0 .7 -12.37 0 .5 -10.84 0 2.03 -11.53 0 2.73
  [4,73,-13.56,0,.7,-12.37,0,.5,-10.84,0,2.03,-11.53,0,2.73],
// 4 73 -13.56 0 -.69 -11.54 0 -2.72 -10.84 0 -2.02 -12.37 0 -.5
  [4,73,-13.56,0,-.69,-11.54,0,-2.72,-10.84,0,-2.02,-12.37,0,-.5],
// 4 73 -14.75 0 -.5 -16.29 0 -2.02 -15.6 0 -2.72 -13.56 0 -.69
  [4,73,-14.75,0,-.5,-16.29,0,-2.02,-15.6,0,-2.72,-13.56,0,-.69],
// 4 73 -16.29 0 2.04 -14.75 0 .5 -13.56 0 .7 -15.59 0 2.73
  [4,73,-16.29,0,2.04,-14.75,0,.5,-13.56,0,.7,-15.59,0,2.73],
// 3 73 -10.6 0 2.96 -11.53 0 2.73 -10.84 0 2.03
  [3,73,-10.6,0,2.96,-11.53,0,2.73,-10.84,0,2.03],
// 3 73 -10.84 0 -2.02 -11.54 0 -2.72 -10.61 0 -2.95
  [3,73,-10.84,0,-2.02,-11.54,0,-2.72,-10.61,0,-2.95],
// 3 73 -16.29 0 -2.02 -16.52 0 -2.95 -15.6 0 -2.72
  [3,73,-16.29,0,-2.02,-16.52,0,-2.95,-15.6,0,-2.72],
// 3 73 -16.52 0 2.97 -16.29 0 2.04 -15.59 0 2.73
  [3,73,-16.52,0,2.97,-16.29,0,2.04,-15.59,0,2.73],
// 4 73 -6.5 0 .5 -12.37 0 .5 -12.37 0 -.5 -6.5 0 -.5
  [4,73,-6.5,0,.5,-12.37,0,.5,-12.37,0,-.5,-6.5,0,-.5],
// 4 73 24.22 0 -.5 25.04 0 0 24.22 0 .5 22.2 0 -.5
  [4,73,24.22,0,-.5,25.04,0,0,24.22,0,.5,22.2,0,-.5],
// 3 73 24.22 0 .5 23.2 0 .5 22.2 0 -.5
  [3,73,24.22,0,.5,23.2,0,.5,22.2,0,-.5],
// 4 73 22.2 0 -.5 23.2 0 .5 21.8 0 .5 20.81 0 -.5
  [4,73,22.2,0,-.5,23.2,0,.5,21.8,0,.5,20.81,0,-.5],
// 4 73 13.56 0 -.69 13.56 0 .7 12.37 0 .5 12.37 0 -.5
  [4,73,13.56,0,-.69,13.56,0,.7,12.37,0,.5,12.37,0,-.5],
// 4 73 13.56 0 .7 13.56 0 -.69 14.75 0 -.5 14.75 0 .5
  [4,73,13.56,0,.7,13.56,0,-.69,14.75,0,-.5,14.75,0,.5],
// 4 73 14.75 0 .5 14.75 0 -.5 20.81 0 -.5 21.8 0 .5
  [4,73,14.75,0,.5,14.75,0,-.5,20.81,0,-.5,21.8,0,.5],
// 4 73 10.84 0 2.03 12.37 0 .5 13.56 0 .7 11.53 0 2.73
  [4,73,10.84,0,2.03,12.37,0,.5,13.56,0,.7,11.53,0,2.73],
// 4 73 10.84 0 -2.02 11.54 0 -2.72 13.56 0 -.69 12.37 0 -.5
  [4,73,10.84,0,-2.02,11.54,0,-2.72,13.56,0,-.69,12.37,0,-.5],
// 4 73 15.6 0 -2.72 16.29 0 -2.02 14.75 0 -.5 13.56 0 -.69
  [4,73,15.6,0,-2.72,16.29,0,-2.02,14.75,0,-.5,13.56,0,-.69],
// 4 73 13.56 0 .7 14.75 0 .5 16.29 0 2.04 15.59 0 2.73
  [4,73,13.56,0,.7,14.75,0,.5,16.29,0,2.04,15.59,0,2.73],
// 3 73 10.6 0 2.96 10.84 0 2.03 11.53 0 2.73
  [3,73,10.6,0,2.96,10.84,0,2.03,11.53,0,2.73],
// 3 73 10.84 0 -2.02 10.61 0 -2.95 11.54 0 -2.72
  [3,73,10.84,0,-2.02,10.61,0,-2.95,11.54,0,-2.72],
// 3 73 16.29 0 -2.02 15.6 0 -2.72 16.52 0 -2.95
  [3,73,16.29,0,-2.02,15.6,0,-2.72,16.52,0,-2.95],
// 3 73 16.52 0 2.97 15.59 0 2.73 16.29 0 2.04
  [3,73,16.52,0,2.97,15.59,0,2.73,16.29,0,2.04],
// 4 73 12.37 0 -.5 12.37 0 .5 6.5 0 .5 6.5 0 -.5
  [4,73,12.37,0,-.5,12.37,0,.5,6.5,0,.5,6.5,0,-.5],
// 4 73 19.29 0 -2.02 19.06 0 -2.95 19.98 0 -2.72 22.2 0 -.5
  [4,73,19.29,0,-2.02,19.06,0,-2.95,19.98,0,-2.72,22.2,0,-.5],
// 3 73 22.2 0 -.5 20.81 0 -.5 19.29 0 -2.02
  [3,73,22.2,0,-.5,20.81,0,-.5,19.29,0,-2.02],
// 4 73 21.8 0 .5 23.2 0 .5 24.73 0 2.04 24.04 0 2.73
  [4,73,21.8,0,.5,23.2,0,.5,24.73,0,2.04,24.04,0,2.73],
// 3 73 24.96 0 2.97 24.04 0 2.73 24.73 0 2.04
  [3,73,24.96,0,2.97,24.04,0,2.73,24.73,0,2.04],
// 4 320 6.5 0 3.75 -6.5 0 3.75 -6.5 0 .5 6.5 0 .5
  [4,320,6.5,0,3.75,-6.5,0,3.75,-6.5,0,.5,6.5,0,.5],
// 4 320 6.5 0 -.5 6.5 0 .5 -6.5 0 .5 -6.5 0 -.5
  [4,320,6.5,0,-.5,6.5,0,.5,-6.5,0,.5,-6.5,0,-.5],
// 4 320 6.5 0 -3.75 6.5 0 -.5 -6.5 0 -.5 -6.5 0 -3.75
  [4,320,6.5,0,-3.75,6.5,0,-.5,-6.5,0,-.5,-6.5,0,-3.75],
// 3 16 -10.84 0 2.03 -12.37 0 .5 -6.5 0 .5
  [3,16,-10.84,0,2.03,-12.37,0,.5,-6.5,0,.5],
// 4 16 -10.6 0 2.96 -10.84 0 2.03 -6.5 0 .5 -6.5 0 3.75
  [4,16,-10.6,0,2.96,-10.84,0,2.03,-6.5,0,.5,-6.5,0,3.75],
// 4 16 -16.52 0 2.97 -10.6 0 2.96 -6.5 0 3.75 -40 0 10
  [4,16,-16.52,0,2.97,-10.6,0,2.96,-6.5,0,3.75,-40,0,10],
// 4 16 -16.52 0 2.97 -15.59 0 2.73 -11.53 0 2.73 -10.6 0 2.96
  [4,16,-16.52,0,2.97,-15.59,0,2.73,-11.53,0,2.73,-10.6,0,2.96],
// 3 16 -15.59 0 2.73 -13.56 0 .7 -11.53 0 2.73
  [3,16,-15.59,0,2.73,-13.56,0,.7,-11.53,0,2.73],
// 4 16 -20.78 0 1.82 -20.78 0 .5 -14.75 0 .5 -16.29 0 2.04
  [4,16,-20.78,0,1.82,-20.78,0,.5,-14.75,0,.5,-16.29,0,2.04],
// 4 16 -21.27 0 2.64 -20.78 0 1.82 -16.29 0 2.04 -16.52 0 2.97
  [4,16,-21.27,0,2.64,-20.78,0,1.82,-16.29,0,2.04,-16.52,0,2.97],
// 4 16 -24.22 0 .5 -21.76 0 .5 -21.76 0 1.82 -40 0 10
  [4,16,-24.22,0,.5,-21.76,0,.5,-21.76,0,1.82,-40,0,10],
// 4 16 -21.77 0 -1.79 -21.76 0 -.5 -24.22 0 -.5 -40 0 -10
  [4,16,-21.77,0,-1.79,-21.76,0,-.5,-24.22,0,-.5,-40,0,-10],
// 4 16 -20.78 0 -1.79 -21.27 0 -2.61 -16.52 0 -2.95 -16.29 0 -2.02
  [4,16,-20.78,0,-1.79,-21.27,0,-2.61,-16.52,0,-2.95,-16.29,0,-2.02],
// 4 16 -20.78 0 -.5 -20.78 0 -1.79 -16.29 0 -2.02 -14.75 0 -.5
  [4,16,-20.78,0,-.5,-20.78,0,-1.79,-16.29,0,-2.02,-14.75,0,-.5],
// 4 16 -15.6 0 -2.72 -16.52 0 -2.95 -10.61 0 -2.95 -11.54 0 -2.72
  [4,16,-15.6,0,-2.72,-16.52,0,-2.95,-10.61,0,-2.95,-11.54,0,-2.72],
// 3 16 -13.56 0 -.69 -15.6 0 -2.72 -11.54 0 -2.72
  [3,16,-13.56,0,-.69,-15.6,0,-2.72,-11.54,0,-2.72],
// 4 16 -6.5 0 -3.75 -10.61 0 -2.95 -16.52 0 -2.95 -40 0 -10
  [4,16,-6.5,0,-3.75,-10.61,0,-2.95,-16.52,0,-2.95,-40,0,-10],
// 4 16 -10.61 0 -2.95 -6.5 0 -3.75 -6.5 0 -.5 -10.84 0 -2.02
  [4,16,-10.61,0,-2.95,-6.5,0,-3.75,-6.5,0,-.5,-10.84,0,-2.02],
// 3 16 -6.5 0 -.5 -12.37 0 -.5 -10.84 0 -2.02
  [3,16,-6.5,0,-.5,-12.37,0,-.5,-10.84,0,-2.02],
// 4 16 6.5 0 3.75 6.5 0 .5 10.84 0 2.03 10.6 0 2.96
  [4,16,6.5,0,3.75,6.5,0,.5,10.84,0,2.03,10.6,0,2.96],
// 3 16 10.84 0 2.03 6.5 0 .5 12.37 0 .5
  [3,16,10.84,0,2.03,6.5,0,.5,12.37,0,.5],
// 4 16 10.6 0 2.96 11.53 0 2.73 15.59 0 2.73 16.52 0 2.97
  [4,16,10.6,0,2.96,11.53,0,2.73,15.59,0,2.73,16.52,0,2.97],
// 4 16 6.5 0 3.75 10.6 0 2.96 16.52 0 2.97 40 0 10
  [4,16,6.5,0,3.75,10.6,0,2.96,16.52,0,2.97,40,0,10],
// 3 16 15.59 0 2.73 11.53 0 2.73 13.56 0 .7
  [3,16,15.59,0,2.73,11.53,0,2.73,13.56,0,.7],
// 4 16 16.29 0 2.04 14.75 0 .5 21.8 0 .5 24.04 0 2.73
  [4,16,16.29,0,2.04,14.75,0,.5,21.8,0,.5,24.04,0,2.73],
// 4 16 16.52 0 2.97 16.29 0 2.04 24.04 0 2.73 24.96 0 2.97
  [4,16,16.52,0,2.97,16.29,0,2.04,24.04,0,2.73,24.96,0,2.97],
// 3 16 24.73 0 2.04 23.2 0 .5 24.22 0 .5
  [3,16,24.73,0,2.04,23.2,0,.5,24.22,0,.5],
// 3 16 24.73 0 2.04 24.22 0 .5 25.04 0 0
  [3,16,24.73,0,2.04,24.22,0,.5,25.04,0,0],
// 4 16 24.96 0 2.97 24.73 0 2.04 25.04 0 0 40 0 10
  [4,16,24.96,0,2.97,24.73,0,2.04,25.04,0,0,40,0,10],
// 4 16 24.22 0 -.5 22.2 0 -.5 19.98 0 -2.72 40 0 -10
  [4,16,24.22,0,-.5,22.2,0,-.5,19.98,0,-2.72,40,0,-10],
// 4 16 14.75 0 -.5 16.29 0 -2.02 19.29 0 -2.02 20.81 0 -.5
  [4,16,14.75,0,-.5,16.29,0,-2.02,19.29,0,-2.02,20.81,0,-.5],
// 4 16 16.29 0 -2.02 16.52 0 -2.95 19.06 0 -2.95 19.29 0 -2.02
  [4,16,16.29,0,-2.02,16.52,0,-2.95,19.06,0,-2.95,19.29,0,-2.02],
// 3 16 13.56 0 -.69 11.54 0 -2.72 15.6 0 -2.72
  [3,16,13.56,0,-.69,11.54,0,-2.72,15.6,0,-2.72],
// 4 16 15.6 0 -2.72 11.54 0 -2.72 10.61 0 -2.95 16.52 0 -2.95
  [4,16,15.6,0,-2.72,11.54,0,-2.72,10.61,0,-2.95,16.52,0,-2.95],
// 4 16 16.52 0 -2.95 10.61 0 -2.95 6.5 0 -3.75 40 0 -10
  [4,16,16.52,0,-2.95,10.61,0,-2.95,6.5,0,-3.75,40,0,-10],
// 4 16 6.5 0 -3.75 10.61 0 -2.95 10.84 0 -2.02 6.5 0 -.5
  [4,16,6.5,0,-3.75,10.61,0,-2.95,10.84,0,-2.02,6.5,0,-.5],
// 3 16 12.37 0 -.5 6.5 0 -.5 10.84 0 -2.02
  [3,16,12.37,0,-.5,6.5,0,-.5,10.84,0,-2.02],
// 3 16 16.52 0 -2.95 40 0 -10 19.06 0 -2.95
  [3,16,16.52,0,-2.95,40,0,-10,19.06,0,-2.95],
// 3 16 19.98 0 -2.72 19.06 0 -2.95 40 0 -10
  [3,16,19.98,0,-2.72,19.06,0,-2.95,40,0,-10],
// 3 16 25.04 0 0 24.22 0 -.5 40 0 -10
  [3,16,25.04,0,0,24.22,0,-.5,40,0,-10],
// 3 16 40 0 10 25.04 0 0 40 0 -10
  [3,16,40,0,10,25.04,0,0,40,0,-10],
// 3 16 40 0 10 16.52 0 2.97 24.96 0 2.97
  [3,16,40,0,10,16.52,0,2.97,24.96,0,2.97],
// 4 16 -6.5 0 3.75 6.5 0 3.75 40 0 10 -40 0 10
  [4,16,-6.5,0,3.75,6.5,0,3.75,40,0,10,-40,0,10],
// 3 16 -40 0 10 -21.27 0 2.64 -16.52 0 2.97
  [3,16,-40,0,10,-21.27,0,2.64,-16.52,0,2.97],
// 3 16 -40 0 10 -21.76 0 1.82 -21.27 0 2.64
  [3,16,-40,0,10,-21.76,0,1.82,-21.27,0,2.64],
// 3 16 -40 0 10 -25.04 0 0 -24.22 0 .5
  [3,16,-40,0,10,-25.04,0,0,-24.22,0,.5],
// 3 16 -40 0 10 -40 0 -10 -25.04 0 0
  [3,16,-40,0,10,-40,0,-10,-25.04,0,0],
// 3 16 -25.04 0 0 -40 0 -10 -24.22 0 -.5
  [3,16,-25.04,0,0,-40,0,-10,-24.22,0,-.5],
// 3 16 -21.77 0 -1.79 -40 0 -10 -21.27 0 -2.61
  [3,16,-21.77,0,-1.79,-40,0,-10,-21.27,0,-2.61],
// 3 16 -21.27 0 -2.61 -40 0 -10 -16.52 0 -2.95
  [3,16,-21.27,0,-2.61,-40,0,-10,-16.52,0,-2.95],
// 4 16 6.5 0 -3.75 -6.5 0 -3.75 -40 0 -10 40 0 -10
  [4,16,6.5,0,-3.75,-6.5,0,-3.75,-40,0,-10,40,0,-10],
];
module ldraw_lib__2431pzo(step=0, col=false, unit=2/5, alt=false, line=0.2, solid=!$preview)
    makepoly(ldraw_lib__2431pzo(), step=step, col=col, unit=unit, alt=alt, line=line, solid=solid);
ldraw_lib__2431pzo(line=0.2);
